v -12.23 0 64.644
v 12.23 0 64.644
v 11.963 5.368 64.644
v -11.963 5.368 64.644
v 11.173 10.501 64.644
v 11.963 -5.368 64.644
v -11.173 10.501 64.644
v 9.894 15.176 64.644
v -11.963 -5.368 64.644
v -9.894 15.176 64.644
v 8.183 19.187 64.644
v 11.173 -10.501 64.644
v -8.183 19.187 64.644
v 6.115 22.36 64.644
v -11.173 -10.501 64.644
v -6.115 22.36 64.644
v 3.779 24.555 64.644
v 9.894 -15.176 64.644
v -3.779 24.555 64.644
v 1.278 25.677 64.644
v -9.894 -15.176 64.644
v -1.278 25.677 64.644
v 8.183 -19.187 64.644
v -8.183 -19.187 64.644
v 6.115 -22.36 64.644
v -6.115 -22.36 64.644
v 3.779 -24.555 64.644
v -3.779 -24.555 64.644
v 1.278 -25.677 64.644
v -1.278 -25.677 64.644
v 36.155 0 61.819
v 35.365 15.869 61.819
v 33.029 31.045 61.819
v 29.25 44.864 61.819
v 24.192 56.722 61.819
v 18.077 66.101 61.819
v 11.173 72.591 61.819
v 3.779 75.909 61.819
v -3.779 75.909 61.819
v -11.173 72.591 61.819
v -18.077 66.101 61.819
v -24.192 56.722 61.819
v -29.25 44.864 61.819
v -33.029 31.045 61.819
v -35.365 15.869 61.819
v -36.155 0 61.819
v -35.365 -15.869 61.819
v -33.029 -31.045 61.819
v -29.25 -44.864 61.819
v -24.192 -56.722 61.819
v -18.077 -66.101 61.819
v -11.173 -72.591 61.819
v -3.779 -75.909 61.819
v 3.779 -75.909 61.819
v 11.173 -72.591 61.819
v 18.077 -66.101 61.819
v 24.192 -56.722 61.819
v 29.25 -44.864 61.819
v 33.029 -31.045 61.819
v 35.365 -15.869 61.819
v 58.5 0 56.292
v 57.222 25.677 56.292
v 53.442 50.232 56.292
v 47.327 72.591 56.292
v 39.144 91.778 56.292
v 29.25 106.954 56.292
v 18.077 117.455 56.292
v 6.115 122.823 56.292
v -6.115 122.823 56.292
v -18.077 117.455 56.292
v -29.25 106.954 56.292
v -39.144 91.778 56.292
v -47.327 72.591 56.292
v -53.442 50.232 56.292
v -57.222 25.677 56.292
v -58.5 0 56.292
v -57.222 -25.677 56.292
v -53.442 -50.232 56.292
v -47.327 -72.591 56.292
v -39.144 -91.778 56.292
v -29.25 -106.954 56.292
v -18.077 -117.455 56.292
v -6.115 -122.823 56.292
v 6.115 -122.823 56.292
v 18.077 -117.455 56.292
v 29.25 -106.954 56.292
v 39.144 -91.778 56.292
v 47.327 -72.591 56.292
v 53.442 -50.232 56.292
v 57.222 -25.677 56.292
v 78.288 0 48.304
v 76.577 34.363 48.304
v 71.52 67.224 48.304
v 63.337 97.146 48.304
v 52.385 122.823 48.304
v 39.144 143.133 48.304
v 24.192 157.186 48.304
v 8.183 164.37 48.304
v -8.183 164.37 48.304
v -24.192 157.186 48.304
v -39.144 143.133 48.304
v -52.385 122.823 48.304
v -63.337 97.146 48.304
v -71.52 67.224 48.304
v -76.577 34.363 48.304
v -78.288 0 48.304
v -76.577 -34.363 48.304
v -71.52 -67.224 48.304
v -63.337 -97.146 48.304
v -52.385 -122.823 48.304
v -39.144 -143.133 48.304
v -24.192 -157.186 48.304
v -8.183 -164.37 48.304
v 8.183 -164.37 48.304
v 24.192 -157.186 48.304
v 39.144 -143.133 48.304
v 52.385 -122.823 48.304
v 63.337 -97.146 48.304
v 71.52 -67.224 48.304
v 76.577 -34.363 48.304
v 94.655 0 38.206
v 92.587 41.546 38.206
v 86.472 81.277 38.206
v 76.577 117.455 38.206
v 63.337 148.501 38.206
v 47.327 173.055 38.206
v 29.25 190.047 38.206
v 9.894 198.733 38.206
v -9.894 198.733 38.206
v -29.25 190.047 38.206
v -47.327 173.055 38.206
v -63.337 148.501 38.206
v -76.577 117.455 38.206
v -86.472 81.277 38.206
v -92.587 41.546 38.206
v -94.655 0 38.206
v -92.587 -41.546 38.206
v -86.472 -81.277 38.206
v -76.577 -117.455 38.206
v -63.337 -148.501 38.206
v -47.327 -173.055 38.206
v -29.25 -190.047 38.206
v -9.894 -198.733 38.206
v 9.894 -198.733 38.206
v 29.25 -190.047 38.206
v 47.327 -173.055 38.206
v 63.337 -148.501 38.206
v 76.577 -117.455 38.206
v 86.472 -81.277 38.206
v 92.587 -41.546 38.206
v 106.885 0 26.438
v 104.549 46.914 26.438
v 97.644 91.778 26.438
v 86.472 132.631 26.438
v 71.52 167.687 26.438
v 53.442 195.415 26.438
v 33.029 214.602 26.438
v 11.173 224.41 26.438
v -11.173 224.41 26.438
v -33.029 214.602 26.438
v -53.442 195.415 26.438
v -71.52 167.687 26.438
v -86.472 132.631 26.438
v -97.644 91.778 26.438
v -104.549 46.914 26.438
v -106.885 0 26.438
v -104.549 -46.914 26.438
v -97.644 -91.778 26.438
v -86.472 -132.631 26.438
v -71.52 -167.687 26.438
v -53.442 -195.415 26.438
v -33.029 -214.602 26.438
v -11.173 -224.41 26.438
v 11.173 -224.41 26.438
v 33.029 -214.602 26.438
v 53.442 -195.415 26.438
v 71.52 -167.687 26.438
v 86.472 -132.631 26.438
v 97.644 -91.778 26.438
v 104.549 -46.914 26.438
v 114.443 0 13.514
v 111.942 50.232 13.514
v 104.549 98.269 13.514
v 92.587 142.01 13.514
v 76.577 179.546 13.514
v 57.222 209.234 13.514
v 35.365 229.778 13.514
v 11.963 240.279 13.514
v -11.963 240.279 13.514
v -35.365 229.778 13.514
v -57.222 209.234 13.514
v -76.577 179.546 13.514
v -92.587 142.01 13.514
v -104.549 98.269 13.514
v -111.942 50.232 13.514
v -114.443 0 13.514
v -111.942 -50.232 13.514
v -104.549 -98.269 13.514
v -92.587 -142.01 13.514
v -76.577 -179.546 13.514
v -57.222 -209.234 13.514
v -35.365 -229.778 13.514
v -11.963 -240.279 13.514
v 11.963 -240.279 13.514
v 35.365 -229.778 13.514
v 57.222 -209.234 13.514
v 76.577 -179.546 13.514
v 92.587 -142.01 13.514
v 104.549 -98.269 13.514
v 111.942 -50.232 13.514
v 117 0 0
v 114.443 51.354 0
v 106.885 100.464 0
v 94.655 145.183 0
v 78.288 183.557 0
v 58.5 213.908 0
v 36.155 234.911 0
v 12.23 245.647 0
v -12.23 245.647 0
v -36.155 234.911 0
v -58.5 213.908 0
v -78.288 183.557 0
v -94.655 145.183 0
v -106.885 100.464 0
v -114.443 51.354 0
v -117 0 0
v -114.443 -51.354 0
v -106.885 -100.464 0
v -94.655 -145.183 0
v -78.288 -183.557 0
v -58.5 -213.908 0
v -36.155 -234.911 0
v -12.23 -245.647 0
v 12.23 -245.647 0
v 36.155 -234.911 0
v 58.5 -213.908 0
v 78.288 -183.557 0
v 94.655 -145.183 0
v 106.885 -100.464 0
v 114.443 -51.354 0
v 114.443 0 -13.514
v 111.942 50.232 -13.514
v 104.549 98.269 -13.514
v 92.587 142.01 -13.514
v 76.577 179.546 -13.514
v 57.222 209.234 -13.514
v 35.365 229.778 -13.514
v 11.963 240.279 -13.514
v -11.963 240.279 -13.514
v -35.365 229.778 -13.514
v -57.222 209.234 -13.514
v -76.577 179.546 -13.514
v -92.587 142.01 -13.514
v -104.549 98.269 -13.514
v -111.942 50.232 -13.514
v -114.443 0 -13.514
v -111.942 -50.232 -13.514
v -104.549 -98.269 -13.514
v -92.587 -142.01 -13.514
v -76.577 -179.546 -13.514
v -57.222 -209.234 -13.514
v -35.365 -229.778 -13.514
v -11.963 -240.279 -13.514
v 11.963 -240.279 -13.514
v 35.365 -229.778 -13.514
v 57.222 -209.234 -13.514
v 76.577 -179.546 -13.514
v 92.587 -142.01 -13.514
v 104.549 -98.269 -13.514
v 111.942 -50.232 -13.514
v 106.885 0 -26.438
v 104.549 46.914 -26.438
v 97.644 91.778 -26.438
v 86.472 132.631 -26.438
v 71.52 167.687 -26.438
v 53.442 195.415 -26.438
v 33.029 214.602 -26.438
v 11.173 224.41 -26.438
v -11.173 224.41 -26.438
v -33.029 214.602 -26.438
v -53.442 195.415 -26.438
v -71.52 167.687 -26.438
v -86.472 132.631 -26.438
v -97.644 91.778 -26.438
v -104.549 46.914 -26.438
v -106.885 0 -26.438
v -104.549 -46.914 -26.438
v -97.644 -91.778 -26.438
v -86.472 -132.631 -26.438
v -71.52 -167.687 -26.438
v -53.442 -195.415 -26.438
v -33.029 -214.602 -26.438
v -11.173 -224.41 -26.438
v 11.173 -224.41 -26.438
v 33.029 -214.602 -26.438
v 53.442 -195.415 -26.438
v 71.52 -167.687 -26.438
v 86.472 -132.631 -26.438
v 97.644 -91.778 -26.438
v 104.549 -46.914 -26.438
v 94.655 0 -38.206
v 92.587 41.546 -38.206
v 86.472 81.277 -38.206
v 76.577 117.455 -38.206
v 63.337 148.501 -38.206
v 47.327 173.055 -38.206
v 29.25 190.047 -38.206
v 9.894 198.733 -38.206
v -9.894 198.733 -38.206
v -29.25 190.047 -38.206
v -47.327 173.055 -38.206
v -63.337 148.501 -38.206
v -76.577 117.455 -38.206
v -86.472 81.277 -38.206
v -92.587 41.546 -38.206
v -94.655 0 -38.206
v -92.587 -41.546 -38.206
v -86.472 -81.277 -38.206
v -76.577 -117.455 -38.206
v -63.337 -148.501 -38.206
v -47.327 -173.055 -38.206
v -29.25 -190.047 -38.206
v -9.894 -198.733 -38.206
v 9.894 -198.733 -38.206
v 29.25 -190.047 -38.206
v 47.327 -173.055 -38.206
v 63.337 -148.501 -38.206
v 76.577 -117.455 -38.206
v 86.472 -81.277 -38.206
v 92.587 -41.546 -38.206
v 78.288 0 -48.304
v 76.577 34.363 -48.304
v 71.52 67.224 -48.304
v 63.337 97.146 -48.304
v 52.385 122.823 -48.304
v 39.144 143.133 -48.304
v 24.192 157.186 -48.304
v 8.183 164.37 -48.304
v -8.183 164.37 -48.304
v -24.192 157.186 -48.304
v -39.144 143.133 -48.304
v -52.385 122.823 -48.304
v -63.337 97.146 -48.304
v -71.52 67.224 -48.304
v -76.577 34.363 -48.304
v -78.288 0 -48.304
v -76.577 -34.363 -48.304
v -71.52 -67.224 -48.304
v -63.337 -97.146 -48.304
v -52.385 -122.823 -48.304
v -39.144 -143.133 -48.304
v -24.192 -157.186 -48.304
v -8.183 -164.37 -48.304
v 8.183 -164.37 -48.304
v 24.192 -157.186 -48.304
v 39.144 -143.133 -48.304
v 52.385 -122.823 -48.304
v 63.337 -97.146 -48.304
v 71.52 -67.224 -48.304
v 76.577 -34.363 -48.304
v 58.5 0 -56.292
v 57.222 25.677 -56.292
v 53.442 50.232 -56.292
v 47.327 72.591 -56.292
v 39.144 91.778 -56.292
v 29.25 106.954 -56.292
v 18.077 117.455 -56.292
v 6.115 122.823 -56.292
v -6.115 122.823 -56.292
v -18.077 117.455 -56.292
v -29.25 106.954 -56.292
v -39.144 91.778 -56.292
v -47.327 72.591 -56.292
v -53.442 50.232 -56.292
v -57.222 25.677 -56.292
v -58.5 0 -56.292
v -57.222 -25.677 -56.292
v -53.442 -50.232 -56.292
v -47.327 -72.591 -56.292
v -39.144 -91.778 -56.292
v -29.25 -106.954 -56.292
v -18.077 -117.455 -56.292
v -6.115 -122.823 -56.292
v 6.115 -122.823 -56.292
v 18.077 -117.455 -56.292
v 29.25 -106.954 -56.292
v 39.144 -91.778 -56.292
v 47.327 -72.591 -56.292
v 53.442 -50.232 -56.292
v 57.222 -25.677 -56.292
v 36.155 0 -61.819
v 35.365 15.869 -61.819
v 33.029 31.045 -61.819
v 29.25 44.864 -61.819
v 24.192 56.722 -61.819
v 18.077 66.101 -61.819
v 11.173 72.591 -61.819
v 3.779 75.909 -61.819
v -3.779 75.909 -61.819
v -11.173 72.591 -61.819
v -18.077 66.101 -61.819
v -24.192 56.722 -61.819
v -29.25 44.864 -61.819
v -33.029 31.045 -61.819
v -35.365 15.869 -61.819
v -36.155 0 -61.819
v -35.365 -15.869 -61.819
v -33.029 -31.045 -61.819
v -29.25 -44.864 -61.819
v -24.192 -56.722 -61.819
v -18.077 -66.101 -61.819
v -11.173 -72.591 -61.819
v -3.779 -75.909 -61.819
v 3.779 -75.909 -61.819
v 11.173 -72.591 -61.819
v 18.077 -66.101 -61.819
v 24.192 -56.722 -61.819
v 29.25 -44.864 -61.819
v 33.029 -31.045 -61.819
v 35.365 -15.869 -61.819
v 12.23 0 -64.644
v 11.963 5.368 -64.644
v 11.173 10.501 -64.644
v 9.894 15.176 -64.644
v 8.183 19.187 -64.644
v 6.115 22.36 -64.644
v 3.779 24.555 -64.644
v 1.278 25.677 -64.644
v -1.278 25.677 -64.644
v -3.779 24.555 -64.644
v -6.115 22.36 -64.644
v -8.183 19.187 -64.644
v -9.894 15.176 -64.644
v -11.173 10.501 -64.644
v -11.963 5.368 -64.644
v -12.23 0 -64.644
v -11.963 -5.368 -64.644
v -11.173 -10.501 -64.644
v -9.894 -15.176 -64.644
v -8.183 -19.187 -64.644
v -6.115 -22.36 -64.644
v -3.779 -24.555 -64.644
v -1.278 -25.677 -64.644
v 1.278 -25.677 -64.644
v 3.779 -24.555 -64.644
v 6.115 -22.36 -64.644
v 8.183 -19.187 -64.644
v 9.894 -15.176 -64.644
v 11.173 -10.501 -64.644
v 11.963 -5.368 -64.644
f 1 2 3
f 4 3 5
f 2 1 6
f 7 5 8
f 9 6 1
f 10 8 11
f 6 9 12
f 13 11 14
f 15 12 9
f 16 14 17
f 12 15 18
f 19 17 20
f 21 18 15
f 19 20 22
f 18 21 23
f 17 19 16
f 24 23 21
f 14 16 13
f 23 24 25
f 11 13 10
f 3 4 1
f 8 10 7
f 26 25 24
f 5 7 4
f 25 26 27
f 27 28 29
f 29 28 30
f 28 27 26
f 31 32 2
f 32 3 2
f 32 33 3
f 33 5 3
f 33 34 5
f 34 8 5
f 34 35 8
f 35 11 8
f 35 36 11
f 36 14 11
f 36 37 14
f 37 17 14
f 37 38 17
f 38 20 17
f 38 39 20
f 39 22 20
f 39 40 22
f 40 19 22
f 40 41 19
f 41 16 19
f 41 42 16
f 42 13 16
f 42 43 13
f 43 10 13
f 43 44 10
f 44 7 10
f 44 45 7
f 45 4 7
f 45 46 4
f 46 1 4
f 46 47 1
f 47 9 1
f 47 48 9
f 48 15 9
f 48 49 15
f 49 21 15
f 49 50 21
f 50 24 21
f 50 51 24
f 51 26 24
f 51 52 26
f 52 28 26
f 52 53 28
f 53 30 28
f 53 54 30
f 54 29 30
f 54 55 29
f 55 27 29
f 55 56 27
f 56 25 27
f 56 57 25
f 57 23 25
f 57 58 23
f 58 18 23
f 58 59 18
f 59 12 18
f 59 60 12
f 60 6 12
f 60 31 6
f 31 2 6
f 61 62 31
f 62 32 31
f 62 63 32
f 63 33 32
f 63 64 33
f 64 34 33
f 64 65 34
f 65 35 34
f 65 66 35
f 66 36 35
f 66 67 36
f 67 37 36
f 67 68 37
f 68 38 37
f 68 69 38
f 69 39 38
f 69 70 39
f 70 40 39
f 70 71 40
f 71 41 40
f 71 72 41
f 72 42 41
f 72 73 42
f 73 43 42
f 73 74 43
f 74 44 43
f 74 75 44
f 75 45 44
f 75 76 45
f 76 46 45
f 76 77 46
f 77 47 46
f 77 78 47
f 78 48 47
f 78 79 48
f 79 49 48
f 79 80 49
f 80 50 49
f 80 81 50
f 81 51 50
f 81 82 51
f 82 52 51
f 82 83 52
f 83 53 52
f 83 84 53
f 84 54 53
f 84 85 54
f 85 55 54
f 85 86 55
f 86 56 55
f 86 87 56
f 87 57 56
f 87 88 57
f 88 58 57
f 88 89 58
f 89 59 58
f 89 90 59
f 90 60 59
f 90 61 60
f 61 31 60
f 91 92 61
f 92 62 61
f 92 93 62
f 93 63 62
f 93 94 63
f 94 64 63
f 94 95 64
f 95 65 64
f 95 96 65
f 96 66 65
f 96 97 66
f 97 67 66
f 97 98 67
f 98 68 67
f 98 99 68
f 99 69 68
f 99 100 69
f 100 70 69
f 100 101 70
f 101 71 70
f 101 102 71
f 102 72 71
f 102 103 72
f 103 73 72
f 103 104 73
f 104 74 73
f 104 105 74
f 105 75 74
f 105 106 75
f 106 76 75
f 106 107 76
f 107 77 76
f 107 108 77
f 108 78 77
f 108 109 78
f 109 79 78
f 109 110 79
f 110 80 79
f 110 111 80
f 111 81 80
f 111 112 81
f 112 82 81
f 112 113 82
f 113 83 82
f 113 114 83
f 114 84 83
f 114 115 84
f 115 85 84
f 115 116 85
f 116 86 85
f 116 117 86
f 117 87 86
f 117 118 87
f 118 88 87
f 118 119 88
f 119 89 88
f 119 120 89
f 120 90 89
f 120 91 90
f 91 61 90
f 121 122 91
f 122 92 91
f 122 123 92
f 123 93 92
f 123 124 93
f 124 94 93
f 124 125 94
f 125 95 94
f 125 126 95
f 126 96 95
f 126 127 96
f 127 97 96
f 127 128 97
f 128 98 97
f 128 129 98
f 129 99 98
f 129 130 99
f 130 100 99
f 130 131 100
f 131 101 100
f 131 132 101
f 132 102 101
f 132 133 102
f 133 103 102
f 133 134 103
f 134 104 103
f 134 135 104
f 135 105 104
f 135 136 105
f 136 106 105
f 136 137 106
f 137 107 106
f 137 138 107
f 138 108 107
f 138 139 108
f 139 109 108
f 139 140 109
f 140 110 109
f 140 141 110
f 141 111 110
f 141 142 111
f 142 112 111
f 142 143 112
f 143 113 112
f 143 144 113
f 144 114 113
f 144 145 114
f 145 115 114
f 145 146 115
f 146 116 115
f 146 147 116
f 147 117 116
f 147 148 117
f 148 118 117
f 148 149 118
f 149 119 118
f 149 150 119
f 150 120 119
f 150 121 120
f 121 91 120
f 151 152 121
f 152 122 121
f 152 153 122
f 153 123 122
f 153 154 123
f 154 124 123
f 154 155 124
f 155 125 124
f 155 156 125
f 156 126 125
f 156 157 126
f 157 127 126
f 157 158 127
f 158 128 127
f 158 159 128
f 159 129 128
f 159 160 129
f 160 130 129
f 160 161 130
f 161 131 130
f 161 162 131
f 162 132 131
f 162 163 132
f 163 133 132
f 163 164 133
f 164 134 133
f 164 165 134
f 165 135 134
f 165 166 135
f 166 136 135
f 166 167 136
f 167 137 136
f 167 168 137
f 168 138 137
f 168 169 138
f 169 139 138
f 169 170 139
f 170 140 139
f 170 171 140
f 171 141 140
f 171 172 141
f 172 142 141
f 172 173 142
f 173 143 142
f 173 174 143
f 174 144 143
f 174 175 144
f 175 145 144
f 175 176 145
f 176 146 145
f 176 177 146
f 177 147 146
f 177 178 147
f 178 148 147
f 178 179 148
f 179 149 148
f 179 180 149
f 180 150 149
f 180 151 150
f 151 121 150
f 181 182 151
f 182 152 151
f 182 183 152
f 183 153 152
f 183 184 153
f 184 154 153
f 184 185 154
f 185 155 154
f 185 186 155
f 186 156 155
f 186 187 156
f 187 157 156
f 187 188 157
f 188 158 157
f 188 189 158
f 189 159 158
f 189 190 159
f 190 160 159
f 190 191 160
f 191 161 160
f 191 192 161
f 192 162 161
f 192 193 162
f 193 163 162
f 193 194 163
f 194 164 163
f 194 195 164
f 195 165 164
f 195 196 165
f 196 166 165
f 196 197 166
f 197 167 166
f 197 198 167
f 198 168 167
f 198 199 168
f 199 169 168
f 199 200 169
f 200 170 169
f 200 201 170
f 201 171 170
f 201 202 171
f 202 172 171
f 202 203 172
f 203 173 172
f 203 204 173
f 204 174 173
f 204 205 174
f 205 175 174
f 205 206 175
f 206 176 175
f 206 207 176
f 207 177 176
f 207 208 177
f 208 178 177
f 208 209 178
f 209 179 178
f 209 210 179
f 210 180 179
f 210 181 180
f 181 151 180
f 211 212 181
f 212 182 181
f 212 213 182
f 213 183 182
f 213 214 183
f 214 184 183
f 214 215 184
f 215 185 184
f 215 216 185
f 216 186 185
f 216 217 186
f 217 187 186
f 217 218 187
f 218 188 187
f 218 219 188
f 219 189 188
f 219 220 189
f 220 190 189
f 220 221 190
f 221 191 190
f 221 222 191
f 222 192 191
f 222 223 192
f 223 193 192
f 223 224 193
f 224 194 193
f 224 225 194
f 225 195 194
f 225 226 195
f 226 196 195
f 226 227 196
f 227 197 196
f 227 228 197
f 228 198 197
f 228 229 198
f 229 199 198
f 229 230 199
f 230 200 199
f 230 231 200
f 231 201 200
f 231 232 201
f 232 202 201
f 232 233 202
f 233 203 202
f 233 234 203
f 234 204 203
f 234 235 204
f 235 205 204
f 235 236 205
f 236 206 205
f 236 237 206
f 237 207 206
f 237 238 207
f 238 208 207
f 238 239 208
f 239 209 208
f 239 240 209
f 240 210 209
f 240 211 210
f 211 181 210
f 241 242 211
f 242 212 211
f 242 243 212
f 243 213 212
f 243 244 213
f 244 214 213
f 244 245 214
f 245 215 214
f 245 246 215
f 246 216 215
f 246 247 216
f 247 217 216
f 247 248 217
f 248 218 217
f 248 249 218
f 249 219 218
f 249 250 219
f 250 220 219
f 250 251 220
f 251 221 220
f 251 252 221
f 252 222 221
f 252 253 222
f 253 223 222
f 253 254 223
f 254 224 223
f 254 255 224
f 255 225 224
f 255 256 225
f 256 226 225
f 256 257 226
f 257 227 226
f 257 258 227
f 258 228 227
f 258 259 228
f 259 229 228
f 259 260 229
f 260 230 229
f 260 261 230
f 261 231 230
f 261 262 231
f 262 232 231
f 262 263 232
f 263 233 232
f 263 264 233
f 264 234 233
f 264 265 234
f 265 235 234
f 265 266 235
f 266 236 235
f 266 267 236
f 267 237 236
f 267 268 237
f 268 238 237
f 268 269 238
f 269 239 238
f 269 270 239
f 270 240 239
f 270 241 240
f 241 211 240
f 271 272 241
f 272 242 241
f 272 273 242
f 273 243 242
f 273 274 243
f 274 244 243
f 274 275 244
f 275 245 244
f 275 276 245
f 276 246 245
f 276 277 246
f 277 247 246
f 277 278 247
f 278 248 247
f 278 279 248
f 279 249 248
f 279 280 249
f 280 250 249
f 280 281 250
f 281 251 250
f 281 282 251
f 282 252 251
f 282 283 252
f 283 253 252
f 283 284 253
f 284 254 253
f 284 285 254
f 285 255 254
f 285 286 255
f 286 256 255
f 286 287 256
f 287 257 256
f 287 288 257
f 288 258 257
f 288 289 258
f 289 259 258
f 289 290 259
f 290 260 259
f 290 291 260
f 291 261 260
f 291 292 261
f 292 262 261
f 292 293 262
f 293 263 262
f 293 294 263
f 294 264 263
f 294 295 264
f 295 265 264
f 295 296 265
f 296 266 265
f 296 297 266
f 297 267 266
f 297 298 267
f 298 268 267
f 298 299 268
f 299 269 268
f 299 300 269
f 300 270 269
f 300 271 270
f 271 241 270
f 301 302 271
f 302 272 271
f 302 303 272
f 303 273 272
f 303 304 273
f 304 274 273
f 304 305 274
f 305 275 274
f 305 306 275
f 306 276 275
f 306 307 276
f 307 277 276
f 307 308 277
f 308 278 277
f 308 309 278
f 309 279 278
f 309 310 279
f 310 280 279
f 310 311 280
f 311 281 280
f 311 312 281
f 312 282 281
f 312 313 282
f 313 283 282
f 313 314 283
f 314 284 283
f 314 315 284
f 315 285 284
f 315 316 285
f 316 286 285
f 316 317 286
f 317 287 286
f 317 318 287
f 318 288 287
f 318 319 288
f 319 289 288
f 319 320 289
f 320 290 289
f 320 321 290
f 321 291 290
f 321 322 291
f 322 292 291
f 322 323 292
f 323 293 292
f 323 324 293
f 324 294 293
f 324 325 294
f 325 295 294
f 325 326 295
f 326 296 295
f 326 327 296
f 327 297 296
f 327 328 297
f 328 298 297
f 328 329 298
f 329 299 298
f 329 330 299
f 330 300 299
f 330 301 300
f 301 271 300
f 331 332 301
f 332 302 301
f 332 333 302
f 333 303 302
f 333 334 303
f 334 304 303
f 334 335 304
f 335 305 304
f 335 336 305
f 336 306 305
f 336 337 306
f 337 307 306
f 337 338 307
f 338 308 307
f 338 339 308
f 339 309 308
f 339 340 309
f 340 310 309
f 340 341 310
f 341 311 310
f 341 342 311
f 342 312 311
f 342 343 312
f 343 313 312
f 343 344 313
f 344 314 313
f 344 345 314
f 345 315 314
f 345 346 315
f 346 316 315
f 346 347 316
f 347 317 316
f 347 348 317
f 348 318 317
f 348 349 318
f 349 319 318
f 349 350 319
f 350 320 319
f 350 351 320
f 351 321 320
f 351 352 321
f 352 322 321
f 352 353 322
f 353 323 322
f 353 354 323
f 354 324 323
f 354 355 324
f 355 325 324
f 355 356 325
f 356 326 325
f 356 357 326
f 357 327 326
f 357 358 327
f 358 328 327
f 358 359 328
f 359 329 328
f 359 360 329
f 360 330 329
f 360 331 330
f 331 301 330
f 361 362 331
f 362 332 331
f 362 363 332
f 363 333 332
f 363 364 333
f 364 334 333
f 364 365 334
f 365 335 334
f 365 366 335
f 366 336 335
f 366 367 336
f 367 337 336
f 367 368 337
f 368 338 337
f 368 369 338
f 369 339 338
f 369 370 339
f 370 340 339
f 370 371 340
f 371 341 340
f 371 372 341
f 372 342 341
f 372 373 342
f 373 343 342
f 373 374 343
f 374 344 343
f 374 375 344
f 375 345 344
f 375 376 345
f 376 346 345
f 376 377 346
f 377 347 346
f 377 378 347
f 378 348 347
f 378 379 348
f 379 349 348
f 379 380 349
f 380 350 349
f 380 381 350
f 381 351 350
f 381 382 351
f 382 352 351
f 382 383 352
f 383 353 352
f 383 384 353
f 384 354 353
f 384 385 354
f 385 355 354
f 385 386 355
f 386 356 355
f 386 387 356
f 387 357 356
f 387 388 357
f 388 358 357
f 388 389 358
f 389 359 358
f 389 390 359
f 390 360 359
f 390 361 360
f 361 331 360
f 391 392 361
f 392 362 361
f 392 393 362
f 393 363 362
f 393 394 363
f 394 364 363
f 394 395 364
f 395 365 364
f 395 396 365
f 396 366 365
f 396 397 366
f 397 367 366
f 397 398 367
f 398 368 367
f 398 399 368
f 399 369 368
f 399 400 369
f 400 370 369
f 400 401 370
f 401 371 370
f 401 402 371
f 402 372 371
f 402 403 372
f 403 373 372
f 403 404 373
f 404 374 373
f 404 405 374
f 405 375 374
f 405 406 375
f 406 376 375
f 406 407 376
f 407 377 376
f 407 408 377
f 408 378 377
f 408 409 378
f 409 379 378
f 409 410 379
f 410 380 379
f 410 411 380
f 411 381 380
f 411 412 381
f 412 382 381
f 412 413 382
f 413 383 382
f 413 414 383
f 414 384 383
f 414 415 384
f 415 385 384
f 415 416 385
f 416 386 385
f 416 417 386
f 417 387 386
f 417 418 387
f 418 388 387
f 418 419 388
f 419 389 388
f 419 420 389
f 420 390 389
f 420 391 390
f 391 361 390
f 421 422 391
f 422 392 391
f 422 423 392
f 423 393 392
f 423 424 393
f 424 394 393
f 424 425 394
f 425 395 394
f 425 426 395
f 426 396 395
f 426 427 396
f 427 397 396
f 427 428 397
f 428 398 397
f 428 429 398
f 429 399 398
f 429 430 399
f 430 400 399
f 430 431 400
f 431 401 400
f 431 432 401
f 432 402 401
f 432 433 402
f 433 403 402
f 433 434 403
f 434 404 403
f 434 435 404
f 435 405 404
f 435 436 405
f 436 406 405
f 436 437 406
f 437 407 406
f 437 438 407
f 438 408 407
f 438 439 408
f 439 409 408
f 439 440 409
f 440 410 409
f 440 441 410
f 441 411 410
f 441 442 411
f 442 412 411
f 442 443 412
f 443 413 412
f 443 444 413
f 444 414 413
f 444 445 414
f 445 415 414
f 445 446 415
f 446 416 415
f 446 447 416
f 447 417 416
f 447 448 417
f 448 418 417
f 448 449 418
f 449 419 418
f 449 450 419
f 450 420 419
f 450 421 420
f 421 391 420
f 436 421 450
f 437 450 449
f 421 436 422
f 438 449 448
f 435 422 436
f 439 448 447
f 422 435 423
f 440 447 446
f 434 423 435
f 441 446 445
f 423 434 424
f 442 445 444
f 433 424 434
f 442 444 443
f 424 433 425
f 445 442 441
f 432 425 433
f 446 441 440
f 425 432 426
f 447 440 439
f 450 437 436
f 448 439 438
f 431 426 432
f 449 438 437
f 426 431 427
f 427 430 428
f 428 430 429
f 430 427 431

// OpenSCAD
// Generated by SolidPython 1.0.1 on 2020-07-29 00:46:49


scale(v = [9, 19, 5]) {
	sphere(r = 13);
}
/***********************************************
*********      SolidPython code:      **********
************************************************
 
# import packages: SolidPython
from solid import *
from solid.utils import *
from itertools import chain, combinations, permutations


class Resize:

    def __init__(self, scad_file):
        self.scad_file = scad_file
        #self.scad_file = import_scad(scad_file)
        # cone/cylinder param:
        self.r1 = 0
        self.r2 = 0
        self.h = 0
        # rectangular prism param:
        self.w = 0
        self.l = 0
        # ellipse param:
        self.r = 0

    # import OpenScad code (file name corresponds to shape)


    # classify shape + parameters
    def assign(self, param1, param2, param3):
        if self.scad_file == 'cone.scad':
            self.r1 = param1
            self.r2 = param2
            self.h = param3
        elif self.scad_file == 'cylinder.scad':
            self.r1 = param1
            self.r2 = param2
            self.h = param3
        elif self.scad_file == 'rectangularPrism.scad':
            self.h = param1
            self.l = param2
            self.w = param3
        else:
            self.r = param1
            self.h = param2

    # resize parameters
    def iterate(self):
        x = range(3, 20, 2)
        i = 1
        if self.scad_file == 'cone.scad':
            tempList = list(permutations(x, 2))
            for temp in tempList:
                param1 = temp[0]
                param2 = temp[1]
                filepath = 'produced_scad_files/' + 'cone' + str(param1) + '_' + str(param2) + '_' + '.scad'
                scad_render_to_file(cylinder(h=param1, r1=param2, r2=0), filepath)

        elif self.scad_file == 'cylinder.scad':
            tempList = list(permutations(x, 3))
            for temp in tempList:
                param1 = temp[0]
                param2 = temp[1]
                filepath = 'produced_scad_files/' + 'cylinder' + str(param1) + '_' + str(param2) + '_' + '.scad'
                scad_render_to_file(cylinder(h=param1, r1=param2, r2=param2), filepath)

        elif self.scad_file == 'rectangularPrism.scad':
            tempList = list(permutations(x, 3))
            for temp in tempList:
                param1 = temp[0]
                param2 = temp[1]
                param3 = temp[2]
                filepath = 'produced_scad_files/' + 'rectangularPrism' + str(param1) + '_' + str(param2) + '_' + str(
                    param3) + '.scad'
                scad_render_to_file(cube(size=(param1, param2, param3)), filepath)

        elif self.scad_file == 'ellipse.scad':
            tempList = list(permutations(x, 4))
            for temp in tempList:
                param1 = temp[0]
                param2 = temp[1]
                param3 = temp[2]
                param4 = temp[3]
                filepath = 'produced_scad_files/' + 'ellipse' + str(param1) + '_' + str(param2) + '_' + str(param3) + '_' + str(param4) + '.scad'
                scad_render_to_file(scale([param1, param2, param3])(sphere(r=param4)), filepath)

    def render_to_scadfile(self):
        scad_render_to_file(scad, 'example.scad') 
 
************************************************/
